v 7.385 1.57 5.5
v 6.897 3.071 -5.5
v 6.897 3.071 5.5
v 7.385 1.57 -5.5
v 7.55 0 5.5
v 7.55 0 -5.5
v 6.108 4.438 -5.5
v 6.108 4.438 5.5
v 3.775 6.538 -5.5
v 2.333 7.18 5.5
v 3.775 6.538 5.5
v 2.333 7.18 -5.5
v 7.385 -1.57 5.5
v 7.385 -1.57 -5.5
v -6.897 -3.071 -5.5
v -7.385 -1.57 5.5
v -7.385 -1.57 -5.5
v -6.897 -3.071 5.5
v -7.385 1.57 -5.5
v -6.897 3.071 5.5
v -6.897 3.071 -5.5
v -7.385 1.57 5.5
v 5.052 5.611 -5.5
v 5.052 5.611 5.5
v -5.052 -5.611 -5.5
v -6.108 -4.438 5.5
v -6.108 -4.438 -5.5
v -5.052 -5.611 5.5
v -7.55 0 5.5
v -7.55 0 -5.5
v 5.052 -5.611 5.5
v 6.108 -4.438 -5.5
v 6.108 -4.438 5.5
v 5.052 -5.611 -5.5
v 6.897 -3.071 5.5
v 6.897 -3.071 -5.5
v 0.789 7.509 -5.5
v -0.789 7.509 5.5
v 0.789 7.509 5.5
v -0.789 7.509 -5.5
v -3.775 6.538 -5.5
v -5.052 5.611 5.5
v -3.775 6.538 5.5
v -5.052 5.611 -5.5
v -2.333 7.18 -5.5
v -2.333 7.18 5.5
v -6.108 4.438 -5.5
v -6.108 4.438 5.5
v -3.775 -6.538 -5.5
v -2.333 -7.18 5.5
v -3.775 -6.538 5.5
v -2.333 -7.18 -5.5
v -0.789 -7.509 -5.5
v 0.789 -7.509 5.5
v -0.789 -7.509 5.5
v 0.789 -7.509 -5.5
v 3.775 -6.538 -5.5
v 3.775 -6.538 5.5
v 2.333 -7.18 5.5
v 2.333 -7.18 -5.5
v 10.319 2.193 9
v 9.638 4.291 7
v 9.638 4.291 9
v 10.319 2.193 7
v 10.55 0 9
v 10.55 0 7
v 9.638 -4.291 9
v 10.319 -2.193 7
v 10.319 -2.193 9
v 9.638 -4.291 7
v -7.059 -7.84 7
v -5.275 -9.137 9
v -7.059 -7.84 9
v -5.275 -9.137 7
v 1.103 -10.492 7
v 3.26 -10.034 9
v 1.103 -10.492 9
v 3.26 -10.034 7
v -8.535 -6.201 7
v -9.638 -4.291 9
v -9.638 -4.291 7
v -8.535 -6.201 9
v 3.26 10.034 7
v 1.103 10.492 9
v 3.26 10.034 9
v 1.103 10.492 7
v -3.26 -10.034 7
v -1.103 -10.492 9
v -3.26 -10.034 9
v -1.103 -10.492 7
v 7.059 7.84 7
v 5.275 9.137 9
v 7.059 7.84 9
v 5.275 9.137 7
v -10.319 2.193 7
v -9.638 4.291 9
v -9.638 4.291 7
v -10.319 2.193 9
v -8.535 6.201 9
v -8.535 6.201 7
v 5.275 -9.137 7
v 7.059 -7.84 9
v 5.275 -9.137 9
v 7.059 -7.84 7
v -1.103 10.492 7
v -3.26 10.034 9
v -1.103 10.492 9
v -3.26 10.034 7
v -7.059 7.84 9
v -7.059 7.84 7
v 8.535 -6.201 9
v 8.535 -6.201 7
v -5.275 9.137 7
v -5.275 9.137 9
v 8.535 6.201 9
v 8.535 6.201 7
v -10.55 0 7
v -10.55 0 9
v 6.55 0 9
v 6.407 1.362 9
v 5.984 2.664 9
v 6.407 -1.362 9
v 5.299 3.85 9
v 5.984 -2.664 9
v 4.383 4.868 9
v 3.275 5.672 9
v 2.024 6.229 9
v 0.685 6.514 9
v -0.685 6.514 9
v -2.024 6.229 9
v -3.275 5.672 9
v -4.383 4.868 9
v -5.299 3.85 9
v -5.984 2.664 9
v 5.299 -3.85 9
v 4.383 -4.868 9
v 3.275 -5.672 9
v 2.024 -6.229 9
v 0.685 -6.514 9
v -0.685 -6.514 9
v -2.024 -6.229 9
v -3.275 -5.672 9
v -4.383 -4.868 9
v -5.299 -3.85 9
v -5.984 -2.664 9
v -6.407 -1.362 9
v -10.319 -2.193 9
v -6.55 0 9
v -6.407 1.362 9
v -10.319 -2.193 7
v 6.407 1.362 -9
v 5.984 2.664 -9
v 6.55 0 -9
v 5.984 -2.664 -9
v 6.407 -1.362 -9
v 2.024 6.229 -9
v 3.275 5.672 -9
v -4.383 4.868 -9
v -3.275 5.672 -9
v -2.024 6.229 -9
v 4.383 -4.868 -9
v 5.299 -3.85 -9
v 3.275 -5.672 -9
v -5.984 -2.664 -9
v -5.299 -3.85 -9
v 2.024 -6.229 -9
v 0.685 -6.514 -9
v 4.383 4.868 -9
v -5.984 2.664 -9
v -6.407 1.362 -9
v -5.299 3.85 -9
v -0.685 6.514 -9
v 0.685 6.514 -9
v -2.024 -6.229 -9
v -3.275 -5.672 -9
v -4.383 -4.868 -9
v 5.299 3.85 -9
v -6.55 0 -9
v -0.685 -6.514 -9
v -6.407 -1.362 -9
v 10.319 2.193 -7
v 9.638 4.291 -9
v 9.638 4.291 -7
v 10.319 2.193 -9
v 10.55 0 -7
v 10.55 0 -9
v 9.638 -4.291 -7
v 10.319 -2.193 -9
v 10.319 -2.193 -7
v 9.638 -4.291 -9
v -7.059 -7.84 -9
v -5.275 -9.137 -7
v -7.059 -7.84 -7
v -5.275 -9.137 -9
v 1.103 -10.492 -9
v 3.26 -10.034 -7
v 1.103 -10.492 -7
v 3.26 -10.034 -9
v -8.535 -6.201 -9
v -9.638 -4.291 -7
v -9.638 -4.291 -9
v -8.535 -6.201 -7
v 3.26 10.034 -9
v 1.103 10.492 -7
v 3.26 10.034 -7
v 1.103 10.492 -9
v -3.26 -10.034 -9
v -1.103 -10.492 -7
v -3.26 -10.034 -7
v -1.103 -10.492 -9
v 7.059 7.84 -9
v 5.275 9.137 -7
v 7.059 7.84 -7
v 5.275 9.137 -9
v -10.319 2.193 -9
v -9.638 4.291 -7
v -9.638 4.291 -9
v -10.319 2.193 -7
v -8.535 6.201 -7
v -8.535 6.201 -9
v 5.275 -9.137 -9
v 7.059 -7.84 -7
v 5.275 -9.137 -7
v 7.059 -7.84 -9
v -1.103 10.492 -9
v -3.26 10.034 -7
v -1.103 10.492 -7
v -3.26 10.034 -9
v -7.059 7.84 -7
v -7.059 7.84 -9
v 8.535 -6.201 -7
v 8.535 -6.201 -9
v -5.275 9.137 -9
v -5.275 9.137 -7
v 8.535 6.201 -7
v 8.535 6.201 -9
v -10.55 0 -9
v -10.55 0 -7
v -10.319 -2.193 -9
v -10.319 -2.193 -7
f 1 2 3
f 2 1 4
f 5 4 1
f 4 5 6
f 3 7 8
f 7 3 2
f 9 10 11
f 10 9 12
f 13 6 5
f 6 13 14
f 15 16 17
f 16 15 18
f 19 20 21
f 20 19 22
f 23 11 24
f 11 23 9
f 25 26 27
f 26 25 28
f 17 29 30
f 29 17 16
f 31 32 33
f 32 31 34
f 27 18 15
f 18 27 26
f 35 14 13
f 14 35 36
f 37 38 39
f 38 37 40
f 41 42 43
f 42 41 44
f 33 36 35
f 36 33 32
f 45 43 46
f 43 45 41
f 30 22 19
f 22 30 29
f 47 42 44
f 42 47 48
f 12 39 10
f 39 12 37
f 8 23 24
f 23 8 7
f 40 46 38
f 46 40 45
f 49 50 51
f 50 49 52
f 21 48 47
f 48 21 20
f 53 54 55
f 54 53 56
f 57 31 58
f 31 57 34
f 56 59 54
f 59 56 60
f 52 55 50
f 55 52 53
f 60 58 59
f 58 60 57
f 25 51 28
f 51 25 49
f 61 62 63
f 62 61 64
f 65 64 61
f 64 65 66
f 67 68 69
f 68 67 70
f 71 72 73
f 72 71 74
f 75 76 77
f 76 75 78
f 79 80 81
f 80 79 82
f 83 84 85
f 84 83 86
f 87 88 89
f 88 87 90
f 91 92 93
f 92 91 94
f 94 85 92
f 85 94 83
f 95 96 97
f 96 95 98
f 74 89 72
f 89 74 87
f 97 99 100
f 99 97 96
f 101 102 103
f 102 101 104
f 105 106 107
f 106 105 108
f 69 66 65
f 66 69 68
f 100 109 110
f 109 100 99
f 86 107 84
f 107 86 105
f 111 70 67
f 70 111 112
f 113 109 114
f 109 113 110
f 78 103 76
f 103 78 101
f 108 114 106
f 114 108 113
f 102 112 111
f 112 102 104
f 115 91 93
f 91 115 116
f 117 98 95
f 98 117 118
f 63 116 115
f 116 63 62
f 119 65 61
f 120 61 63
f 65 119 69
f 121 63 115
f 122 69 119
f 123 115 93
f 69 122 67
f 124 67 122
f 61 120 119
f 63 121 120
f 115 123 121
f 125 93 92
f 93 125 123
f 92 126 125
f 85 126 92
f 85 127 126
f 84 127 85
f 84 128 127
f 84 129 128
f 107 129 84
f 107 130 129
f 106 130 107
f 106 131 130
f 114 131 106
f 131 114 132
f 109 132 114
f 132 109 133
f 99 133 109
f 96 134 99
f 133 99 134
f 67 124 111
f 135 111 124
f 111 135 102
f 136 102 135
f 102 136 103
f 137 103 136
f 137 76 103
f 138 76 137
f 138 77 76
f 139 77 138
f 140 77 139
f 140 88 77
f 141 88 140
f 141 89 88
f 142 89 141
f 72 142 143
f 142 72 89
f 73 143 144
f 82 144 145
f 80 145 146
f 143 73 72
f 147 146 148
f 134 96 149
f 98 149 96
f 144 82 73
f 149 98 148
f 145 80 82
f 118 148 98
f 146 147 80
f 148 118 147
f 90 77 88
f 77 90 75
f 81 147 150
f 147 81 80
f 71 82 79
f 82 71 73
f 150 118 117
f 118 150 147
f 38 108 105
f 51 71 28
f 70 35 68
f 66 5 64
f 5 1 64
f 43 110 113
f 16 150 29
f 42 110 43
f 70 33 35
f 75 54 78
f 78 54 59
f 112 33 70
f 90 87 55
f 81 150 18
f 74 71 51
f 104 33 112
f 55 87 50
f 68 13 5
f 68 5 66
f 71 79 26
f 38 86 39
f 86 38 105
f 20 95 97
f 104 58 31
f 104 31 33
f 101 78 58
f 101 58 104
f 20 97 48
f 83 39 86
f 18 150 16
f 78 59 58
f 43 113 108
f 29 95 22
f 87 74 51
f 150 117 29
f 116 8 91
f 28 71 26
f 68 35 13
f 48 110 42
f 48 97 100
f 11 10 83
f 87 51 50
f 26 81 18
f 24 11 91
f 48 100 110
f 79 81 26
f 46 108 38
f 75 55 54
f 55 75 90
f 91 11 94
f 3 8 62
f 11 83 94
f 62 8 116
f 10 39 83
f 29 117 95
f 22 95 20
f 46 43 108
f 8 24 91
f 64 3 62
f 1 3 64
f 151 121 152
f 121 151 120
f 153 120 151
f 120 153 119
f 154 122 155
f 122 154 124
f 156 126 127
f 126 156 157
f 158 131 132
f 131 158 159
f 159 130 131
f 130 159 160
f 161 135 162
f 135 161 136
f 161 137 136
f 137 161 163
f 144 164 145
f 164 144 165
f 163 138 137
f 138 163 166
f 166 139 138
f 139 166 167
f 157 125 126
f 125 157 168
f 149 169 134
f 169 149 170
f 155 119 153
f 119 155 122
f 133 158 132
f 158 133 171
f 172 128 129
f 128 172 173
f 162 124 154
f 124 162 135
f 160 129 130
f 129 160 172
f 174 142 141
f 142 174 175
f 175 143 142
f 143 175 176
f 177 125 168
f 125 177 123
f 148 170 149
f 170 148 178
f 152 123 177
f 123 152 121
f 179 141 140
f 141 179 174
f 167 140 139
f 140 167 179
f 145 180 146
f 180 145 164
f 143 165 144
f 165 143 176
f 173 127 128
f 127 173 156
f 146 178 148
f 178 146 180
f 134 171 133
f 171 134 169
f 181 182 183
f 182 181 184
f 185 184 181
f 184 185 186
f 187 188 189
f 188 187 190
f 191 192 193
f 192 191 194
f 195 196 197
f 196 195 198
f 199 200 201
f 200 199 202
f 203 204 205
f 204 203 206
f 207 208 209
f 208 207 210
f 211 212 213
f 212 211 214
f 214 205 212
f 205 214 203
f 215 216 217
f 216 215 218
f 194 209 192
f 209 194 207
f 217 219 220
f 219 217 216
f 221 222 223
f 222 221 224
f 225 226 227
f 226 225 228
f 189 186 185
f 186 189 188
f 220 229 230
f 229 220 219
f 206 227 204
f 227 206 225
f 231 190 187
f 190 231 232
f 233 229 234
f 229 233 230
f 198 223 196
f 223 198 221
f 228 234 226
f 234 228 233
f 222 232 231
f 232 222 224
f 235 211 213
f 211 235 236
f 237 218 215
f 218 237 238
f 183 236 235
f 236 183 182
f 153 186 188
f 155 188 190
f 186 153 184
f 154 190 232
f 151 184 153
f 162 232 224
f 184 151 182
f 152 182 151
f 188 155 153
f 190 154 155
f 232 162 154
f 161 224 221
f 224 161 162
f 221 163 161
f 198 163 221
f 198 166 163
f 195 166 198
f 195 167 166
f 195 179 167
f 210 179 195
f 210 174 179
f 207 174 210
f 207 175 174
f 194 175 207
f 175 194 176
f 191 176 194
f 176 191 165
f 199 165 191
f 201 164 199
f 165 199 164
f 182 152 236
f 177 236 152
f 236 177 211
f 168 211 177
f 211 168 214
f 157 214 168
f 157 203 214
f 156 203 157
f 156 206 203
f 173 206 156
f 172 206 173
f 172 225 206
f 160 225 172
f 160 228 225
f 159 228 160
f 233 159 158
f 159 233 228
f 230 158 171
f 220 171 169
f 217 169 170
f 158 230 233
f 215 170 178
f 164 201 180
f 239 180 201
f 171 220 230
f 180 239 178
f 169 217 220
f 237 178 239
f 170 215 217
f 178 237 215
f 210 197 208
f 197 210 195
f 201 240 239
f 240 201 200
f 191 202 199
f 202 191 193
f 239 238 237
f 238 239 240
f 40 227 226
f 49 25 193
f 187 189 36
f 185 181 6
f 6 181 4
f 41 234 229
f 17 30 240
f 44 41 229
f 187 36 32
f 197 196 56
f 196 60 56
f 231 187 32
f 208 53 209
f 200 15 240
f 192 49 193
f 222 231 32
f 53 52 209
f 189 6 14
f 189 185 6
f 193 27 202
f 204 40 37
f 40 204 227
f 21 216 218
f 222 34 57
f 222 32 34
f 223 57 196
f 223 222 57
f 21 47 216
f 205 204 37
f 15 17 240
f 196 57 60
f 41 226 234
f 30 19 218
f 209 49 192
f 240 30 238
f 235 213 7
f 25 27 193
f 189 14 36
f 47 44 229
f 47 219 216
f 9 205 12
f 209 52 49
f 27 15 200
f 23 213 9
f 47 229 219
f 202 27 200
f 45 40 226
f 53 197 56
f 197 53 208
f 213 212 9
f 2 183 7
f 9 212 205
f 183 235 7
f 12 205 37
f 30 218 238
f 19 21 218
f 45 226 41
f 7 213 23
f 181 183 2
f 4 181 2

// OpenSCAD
//variables (mm)
	idlerID = 13.1;
	idlerOD = 15.1;
	beltwidth= 1.5;
	$fn=30; //faceting

//these are the lips that hold the belt on
	lipheight = 3;
	lipthickness = 2;
	topangle = 60; //the angle the top lip overhang makes. You can increase this to lower the idler profile.


truc();
mirror([0,0,1]) truc();
module truc(){
//construction
	difference(){
	union(){
		//cylinder(r=lipheight+idlerOD/2, h=lipthickness);
		cylinder(r=idlerOD/2, h = lipthickness*2+beltwidth+lipheight*cos(topangle));
		translate([0,0,lipthickness*2+beltwidth+lipheight*cos(topangle)])cylinder(r=lipheight+idlerOD/2, h=lipthickness);
		translate([0,0,beltwidth+lipthickness*2])cylinder(r1=idlerOD/2, r2=lipheight+idlerOD/2, h=lipheight*cos(topangle));
		}
		translate([0,0,-1])cylinder(r=idlerID/2, h=lipthickness*2+beltwidth+lipheight*2);
}
}
